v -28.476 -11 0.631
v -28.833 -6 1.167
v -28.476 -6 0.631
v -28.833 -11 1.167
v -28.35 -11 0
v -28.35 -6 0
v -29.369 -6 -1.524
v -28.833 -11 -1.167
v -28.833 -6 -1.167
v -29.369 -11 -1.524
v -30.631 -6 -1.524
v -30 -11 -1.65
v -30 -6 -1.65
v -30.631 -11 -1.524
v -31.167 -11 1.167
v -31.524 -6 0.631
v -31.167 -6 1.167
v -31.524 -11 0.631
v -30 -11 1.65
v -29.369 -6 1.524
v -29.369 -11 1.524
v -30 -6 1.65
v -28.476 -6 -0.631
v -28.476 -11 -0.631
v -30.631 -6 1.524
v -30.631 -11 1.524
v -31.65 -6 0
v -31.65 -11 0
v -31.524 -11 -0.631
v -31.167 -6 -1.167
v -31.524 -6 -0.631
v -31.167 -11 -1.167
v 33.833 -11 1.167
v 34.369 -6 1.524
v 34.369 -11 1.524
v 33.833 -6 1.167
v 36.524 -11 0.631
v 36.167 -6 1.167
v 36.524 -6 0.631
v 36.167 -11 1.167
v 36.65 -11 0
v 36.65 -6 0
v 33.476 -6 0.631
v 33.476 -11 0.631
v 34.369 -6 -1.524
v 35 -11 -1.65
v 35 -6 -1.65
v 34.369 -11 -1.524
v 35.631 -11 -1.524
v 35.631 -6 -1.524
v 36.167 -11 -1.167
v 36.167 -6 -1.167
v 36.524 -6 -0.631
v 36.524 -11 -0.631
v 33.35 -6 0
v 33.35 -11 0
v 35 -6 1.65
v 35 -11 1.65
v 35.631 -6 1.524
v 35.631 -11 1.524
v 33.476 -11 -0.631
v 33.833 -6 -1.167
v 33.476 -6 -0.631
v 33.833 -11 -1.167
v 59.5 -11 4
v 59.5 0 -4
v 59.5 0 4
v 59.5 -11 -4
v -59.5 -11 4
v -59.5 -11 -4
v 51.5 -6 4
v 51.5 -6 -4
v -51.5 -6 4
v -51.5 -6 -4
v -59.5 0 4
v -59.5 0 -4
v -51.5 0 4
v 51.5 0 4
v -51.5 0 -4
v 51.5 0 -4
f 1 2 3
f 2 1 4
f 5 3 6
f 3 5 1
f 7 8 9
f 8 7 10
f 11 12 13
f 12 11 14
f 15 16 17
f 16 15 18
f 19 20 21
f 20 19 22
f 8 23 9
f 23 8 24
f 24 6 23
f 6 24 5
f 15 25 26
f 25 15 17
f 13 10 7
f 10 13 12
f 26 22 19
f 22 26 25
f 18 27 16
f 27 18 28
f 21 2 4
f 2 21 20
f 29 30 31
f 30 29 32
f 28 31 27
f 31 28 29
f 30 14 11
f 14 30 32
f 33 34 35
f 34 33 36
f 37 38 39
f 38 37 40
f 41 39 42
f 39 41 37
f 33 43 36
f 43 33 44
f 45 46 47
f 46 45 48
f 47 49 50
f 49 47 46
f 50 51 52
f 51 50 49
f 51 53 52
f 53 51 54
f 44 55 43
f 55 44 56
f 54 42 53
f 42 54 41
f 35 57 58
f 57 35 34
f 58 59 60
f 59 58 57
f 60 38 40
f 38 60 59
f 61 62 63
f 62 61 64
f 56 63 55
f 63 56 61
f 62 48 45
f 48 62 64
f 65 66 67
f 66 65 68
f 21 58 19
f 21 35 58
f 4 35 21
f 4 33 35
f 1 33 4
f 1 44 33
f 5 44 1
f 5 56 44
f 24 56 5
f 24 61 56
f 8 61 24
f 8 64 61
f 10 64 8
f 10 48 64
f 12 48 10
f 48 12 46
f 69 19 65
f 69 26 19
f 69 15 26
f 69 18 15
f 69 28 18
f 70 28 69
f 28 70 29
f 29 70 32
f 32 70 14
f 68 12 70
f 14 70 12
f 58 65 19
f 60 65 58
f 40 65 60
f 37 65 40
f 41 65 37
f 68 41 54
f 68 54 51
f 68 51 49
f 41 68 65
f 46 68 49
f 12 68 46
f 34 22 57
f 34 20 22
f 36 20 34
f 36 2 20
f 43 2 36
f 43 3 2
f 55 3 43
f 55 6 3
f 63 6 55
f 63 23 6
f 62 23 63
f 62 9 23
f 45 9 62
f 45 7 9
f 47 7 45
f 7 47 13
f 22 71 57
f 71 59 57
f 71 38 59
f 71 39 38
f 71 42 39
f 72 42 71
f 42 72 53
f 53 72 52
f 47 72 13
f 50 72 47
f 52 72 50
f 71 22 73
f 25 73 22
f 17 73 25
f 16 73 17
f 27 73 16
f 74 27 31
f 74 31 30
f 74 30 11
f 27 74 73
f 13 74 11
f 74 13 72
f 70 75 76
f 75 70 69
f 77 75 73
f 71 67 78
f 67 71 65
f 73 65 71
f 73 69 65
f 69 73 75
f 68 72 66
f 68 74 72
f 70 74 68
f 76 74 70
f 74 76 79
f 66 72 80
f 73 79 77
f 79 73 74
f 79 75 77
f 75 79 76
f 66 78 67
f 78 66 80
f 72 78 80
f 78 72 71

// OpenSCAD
//
//  fixing bar for Raspberry Pi 7 inch display
//
//  you need two of these and four e.g. 10mm M3 screws
//  make sure the screws do not bottom out, or you may destroy the LCD panel!
//
//  design by egil kvaleberg, 20 may 2019
//

padw = 8.0; // general width of bar and size of square pads
padh = 6.0; // heigth of pads, use 6.0 for thin panels, but can be decreased to 0.0 for really thick ones
barh = 5.0; // height of bar itself, the larger the stronger. screw length needs to be adjusted accordingly, of course.

hdist = 65.0; // distance between holes
hoffs = 2.5; // not centered
hdia = 3.3; // hole diameter
hlen = 103.0; // bar length less pads

rotate([90,0,0]) {
    difference () {
        translate([-hlen/2-padw, -padw/2, padh])
          cube([hlen+2*padw, padw, barh]);
        for (dx = [-1,1]) translate([hoffs+dx*hdist/2,0,0]) 
          cylinder(d=hdia, h=padh+barh+1, $fn=16);
    } 
    for (dx = [-1,1]) translate([dx*(hlen/2+padw/2)-padw/2, -padw/2, 0])
      cube([padw, padw, padh]);
}
